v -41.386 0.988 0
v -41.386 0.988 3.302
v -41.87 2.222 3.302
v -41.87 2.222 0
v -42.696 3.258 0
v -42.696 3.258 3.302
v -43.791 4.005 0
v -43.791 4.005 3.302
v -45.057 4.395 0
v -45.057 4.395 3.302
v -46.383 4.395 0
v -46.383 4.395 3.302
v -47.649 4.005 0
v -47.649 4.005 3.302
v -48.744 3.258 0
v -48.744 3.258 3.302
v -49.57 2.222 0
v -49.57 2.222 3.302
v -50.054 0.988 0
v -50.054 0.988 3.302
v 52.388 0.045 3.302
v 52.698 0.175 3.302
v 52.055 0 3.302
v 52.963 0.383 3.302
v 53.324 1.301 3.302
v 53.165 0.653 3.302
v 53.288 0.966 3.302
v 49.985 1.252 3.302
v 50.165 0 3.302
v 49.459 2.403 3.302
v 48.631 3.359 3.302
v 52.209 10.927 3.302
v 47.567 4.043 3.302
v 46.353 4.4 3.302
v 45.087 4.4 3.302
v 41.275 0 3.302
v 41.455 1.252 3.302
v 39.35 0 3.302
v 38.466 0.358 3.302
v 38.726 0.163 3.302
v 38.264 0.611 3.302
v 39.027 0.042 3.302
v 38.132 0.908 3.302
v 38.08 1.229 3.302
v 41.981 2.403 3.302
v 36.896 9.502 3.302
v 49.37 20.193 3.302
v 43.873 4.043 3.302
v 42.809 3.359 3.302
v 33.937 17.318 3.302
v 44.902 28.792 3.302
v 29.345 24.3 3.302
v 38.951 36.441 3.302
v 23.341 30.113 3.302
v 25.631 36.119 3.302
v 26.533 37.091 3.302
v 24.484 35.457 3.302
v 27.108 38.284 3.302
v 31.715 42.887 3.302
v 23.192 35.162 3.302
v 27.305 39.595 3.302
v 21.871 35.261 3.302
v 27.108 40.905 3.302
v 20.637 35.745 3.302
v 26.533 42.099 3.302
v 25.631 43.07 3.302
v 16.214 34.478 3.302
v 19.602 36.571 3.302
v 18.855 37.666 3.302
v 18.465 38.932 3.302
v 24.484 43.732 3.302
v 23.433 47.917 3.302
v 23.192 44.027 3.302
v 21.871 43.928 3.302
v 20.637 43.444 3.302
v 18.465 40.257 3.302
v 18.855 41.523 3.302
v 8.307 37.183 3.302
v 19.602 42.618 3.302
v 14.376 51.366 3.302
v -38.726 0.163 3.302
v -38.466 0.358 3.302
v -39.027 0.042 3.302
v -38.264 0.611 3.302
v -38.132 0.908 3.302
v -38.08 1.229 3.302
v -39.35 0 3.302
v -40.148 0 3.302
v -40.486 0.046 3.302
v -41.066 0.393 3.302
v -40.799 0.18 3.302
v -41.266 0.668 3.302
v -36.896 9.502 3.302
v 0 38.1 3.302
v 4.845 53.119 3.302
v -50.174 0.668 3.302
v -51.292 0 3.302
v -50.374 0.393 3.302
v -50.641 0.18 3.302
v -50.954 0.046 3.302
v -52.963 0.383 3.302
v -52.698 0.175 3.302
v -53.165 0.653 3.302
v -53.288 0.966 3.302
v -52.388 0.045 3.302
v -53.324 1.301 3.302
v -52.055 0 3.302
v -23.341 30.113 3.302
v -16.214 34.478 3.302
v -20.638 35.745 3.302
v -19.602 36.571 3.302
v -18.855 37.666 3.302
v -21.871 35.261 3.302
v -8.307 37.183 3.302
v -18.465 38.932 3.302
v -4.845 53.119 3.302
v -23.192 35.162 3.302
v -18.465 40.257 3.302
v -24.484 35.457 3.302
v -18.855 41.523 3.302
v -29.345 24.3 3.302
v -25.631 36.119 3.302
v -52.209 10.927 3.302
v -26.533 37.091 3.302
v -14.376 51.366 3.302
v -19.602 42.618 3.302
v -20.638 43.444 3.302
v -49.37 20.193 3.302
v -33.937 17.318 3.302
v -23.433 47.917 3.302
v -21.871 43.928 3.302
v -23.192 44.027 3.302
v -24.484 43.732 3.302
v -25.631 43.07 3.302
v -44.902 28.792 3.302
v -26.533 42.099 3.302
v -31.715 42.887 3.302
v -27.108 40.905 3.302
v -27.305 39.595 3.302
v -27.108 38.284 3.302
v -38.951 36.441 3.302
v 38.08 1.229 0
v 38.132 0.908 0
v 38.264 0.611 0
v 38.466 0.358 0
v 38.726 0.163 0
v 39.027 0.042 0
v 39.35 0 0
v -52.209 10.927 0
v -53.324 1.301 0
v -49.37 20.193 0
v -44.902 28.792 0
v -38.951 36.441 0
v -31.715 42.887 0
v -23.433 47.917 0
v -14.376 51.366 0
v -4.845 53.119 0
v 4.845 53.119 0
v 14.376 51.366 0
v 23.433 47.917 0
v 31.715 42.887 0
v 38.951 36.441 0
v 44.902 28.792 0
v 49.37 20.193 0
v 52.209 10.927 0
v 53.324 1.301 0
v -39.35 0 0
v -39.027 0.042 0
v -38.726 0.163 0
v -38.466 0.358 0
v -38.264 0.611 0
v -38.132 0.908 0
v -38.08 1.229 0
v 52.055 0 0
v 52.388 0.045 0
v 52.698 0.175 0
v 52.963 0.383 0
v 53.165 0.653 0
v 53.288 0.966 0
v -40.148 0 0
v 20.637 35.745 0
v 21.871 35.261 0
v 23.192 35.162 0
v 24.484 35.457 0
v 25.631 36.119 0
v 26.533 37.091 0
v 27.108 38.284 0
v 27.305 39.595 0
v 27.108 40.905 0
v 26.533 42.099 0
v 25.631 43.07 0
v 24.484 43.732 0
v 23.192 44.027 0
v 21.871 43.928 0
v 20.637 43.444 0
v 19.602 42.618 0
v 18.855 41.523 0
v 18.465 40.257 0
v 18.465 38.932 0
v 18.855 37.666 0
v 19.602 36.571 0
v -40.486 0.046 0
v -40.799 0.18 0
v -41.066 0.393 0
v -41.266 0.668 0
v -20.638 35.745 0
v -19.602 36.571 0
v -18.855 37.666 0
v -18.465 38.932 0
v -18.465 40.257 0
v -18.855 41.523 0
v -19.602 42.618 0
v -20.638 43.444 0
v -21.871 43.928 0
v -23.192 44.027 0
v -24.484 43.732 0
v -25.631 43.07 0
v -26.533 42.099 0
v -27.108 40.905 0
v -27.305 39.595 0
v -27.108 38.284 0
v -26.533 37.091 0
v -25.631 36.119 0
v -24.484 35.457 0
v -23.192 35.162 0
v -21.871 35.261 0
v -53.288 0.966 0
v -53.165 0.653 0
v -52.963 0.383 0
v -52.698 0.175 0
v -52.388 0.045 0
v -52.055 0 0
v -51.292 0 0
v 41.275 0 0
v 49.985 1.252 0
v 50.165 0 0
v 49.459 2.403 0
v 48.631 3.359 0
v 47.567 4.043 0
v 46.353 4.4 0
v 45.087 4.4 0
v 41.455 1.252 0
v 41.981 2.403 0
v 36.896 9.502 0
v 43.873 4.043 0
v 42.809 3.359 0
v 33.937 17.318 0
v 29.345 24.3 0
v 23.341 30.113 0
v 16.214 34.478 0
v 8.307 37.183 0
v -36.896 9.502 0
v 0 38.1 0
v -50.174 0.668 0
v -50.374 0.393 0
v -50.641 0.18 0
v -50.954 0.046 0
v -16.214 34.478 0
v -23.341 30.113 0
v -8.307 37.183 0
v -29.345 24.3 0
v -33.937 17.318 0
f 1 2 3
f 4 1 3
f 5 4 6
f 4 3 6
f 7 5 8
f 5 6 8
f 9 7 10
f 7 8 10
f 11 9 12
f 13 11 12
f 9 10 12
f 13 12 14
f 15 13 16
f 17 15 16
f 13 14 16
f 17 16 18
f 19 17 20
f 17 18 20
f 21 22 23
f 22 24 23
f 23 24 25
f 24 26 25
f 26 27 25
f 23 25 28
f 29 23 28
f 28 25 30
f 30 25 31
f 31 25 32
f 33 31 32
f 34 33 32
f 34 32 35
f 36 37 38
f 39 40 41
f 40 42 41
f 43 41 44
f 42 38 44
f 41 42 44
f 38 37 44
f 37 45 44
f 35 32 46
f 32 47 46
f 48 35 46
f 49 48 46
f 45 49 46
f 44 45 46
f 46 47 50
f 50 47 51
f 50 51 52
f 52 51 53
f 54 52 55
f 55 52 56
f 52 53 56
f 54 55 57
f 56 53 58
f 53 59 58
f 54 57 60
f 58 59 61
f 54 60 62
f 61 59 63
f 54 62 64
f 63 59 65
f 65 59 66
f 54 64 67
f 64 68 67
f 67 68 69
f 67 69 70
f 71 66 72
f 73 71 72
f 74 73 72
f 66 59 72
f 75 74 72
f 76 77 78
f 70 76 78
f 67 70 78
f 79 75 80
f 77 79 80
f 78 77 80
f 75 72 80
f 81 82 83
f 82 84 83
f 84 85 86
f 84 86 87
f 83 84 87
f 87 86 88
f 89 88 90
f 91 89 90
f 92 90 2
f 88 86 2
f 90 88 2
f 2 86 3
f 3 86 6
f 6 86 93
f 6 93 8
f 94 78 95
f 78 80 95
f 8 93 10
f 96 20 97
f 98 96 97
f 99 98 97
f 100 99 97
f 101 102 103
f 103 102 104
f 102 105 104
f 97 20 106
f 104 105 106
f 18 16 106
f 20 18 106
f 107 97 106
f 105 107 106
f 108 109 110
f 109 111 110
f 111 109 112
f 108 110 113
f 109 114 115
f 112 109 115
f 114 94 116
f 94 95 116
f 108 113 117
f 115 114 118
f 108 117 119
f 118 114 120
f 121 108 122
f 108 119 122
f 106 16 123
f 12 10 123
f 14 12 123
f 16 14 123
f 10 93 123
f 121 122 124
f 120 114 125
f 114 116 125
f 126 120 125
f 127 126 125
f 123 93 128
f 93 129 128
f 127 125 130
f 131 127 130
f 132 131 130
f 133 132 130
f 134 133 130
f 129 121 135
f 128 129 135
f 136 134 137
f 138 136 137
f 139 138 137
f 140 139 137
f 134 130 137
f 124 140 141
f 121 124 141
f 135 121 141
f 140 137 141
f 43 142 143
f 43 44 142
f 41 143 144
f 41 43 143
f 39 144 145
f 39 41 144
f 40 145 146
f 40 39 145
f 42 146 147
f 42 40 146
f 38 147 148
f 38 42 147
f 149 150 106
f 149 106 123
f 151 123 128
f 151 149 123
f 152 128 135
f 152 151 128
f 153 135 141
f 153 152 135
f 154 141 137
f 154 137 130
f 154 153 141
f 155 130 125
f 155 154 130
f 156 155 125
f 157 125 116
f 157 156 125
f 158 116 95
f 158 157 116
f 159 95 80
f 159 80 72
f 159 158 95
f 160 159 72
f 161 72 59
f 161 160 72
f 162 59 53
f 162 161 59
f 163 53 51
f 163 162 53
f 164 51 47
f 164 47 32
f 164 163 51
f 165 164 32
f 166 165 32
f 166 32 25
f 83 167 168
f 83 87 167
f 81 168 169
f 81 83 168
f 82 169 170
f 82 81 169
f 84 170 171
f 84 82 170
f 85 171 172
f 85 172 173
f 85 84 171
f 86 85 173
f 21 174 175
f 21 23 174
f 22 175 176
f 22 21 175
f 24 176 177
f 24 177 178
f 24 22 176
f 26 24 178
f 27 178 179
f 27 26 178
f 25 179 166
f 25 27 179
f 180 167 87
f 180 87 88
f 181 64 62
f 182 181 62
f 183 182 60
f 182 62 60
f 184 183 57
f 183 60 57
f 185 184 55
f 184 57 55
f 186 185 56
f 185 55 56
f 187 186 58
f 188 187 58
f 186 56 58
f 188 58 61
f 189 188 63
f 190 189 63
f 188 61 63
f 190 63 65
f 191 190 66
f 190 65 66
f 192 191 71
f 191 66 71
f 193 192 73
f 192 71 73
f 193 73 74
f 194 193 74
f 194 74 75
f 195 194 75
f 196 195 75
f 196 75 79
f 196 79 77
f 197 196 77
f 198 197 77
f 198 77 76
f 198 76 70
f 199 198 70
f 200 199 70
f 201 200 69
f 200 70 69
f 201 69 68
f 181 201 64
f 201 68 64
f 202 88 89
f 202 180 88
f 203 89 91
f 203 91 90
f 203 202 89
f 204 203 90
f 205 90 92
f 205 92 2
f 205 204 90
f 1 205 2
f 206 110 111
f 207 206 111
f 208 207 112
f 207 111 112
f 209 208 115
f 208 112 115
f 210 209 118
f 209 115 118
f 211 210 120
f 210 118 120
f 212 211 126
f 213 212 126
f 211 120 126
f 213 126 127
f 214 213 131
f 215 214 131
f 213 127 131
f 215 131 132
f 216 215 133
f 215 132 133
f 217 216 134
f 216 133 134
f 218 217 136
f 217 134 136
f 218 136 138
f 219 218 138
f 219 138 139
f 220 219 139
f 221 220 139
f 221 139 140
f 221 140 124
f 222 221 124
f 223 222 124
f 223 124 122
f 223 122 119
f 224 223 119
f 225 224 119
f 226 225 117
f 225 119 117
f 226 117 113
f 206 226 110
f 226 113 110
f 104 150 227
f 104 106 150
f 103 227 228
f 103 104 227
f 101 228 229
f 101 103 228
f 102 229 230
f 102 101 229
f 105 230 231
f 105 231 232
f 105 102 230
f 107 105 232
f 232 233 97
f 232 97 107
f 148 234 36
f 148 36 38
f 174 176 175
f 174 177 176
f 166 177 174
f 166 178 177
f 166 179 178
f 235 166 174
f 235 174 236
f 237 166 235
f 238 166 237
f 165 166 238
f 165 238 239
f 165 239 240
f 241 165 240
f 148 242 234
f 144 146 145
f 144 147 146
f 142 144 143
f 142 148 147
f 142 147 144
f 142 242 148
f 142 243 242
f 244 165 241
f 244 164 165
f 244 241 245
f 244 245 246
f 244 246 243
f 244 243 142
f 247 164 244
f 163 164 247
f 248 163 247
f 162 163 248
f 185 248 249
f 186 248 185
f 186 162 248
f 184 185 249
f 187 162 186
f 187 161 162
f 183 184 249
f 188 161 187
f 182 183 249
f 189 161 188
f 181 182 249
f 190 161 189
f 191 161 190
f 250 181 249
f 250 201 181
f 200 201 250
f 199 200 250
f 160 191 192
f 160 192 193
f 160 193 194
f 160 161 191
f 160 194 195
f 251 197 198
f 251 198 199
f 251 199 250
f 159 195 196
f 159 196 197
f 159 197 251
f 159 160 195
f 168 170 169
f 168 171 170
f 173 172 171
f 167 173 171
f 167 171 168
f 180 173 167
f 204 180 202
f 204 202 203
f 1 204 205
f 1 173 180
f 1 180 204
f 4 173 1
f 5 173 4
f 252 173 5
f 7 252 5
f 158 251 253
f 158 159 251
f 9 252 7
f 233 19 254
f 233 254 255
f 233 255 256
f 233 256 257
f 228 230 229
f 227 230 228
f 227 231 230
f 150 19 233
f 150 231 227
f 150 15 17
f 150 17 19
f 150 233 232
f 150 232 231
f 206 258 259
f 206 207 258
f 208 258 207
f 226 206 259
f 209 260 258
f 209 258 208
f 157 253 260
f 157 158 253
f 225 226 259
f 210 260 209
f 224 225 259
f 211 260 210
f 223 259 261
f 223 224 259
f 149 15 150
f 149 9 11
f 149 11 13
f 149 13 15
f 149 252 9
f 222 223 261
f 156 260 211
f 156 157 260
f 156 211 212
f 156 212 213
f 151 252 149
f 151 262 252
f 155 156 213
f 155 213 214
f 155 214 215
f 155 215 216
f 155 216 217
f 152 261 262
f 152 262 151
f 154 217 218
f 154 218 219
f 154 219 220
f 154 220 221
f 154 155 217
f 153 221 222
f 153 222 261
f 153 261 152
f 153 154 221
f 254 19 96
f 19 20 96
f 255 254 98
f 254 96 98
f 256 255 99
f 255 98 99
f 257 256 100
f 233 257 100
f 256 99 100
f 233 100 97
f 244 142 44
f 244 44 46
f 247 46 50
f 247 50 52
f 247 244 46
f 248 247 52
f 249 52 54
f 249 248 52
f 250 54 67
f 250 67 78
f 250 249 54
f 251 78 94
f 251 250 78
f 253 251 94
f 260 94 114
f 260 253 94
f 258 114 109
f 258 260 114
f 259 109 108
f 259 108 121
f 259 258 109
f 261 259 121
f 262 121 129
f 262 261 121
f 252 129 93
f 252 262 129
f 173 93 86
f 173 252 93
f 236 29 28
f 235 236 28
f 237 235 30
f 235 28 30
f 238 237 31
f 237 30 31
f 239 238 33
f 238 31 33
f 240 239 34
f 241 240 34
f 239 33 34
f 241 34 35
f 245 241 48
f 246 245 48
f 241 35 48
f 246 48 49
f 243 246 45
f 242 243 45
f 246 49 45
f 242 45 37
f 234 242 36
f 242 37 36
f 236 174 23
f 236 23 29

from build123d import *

# Parameters (mm, degrees)
SALIENTE_EXTRUIR1_DEPTH = 3.302
CROQUIS2_R              = 4.445
CORTAR_EXTRUIR1_DEPTH   = 3.302
MATRIZC1_COUNT          = 4
MATRIZC1_ANGLE          = 180
REDONDEO1_R             = 1.27


with BuildPart() as part:
    # Croquis1 → Saliente-Extruir1 (new body)
    with BuildSketch(Plane.XY):
        with BuildLine():
            Line((-38.1, 0), (-53.34, 0))
            ThreePointArc((-53.34, 0), (0, 53.34), (53.34, 0))
            Line((53.34, 0), (38.1, 0))
            ThreePointArc((38.1, 0), (0, 38.1), (-38.1, 0))
        make_face()
    extrude(amount=SALIENTE_EXTRUIR1_DEPTH)

    # Croquis2 → Cortar-Extruir1 (cut)
    with BuildSketch(Plane.XY.offset(3.302)):
        with Locations((-45.72, 0)):
            Circle(CROQUIS2_R)
    cortar_extruir1 = extrude(amount=-CORTAR_EXTRUIR1_DEPTH, mode=Mode.SUBTRACT)

    # MatrizC1: Cortar-Extruir1 ×4 about axis
    matrizc1_axis = Axis((0, 0, 3.302), (0, 0, -1))
    for i in range(1, MATRIZC1_COUNT):
        add(cortar_extruir1.rotate(matrizc1_axis, i * MATRIZC1_ANGLE / (MATRIZC1_COUNT - 1)), mode=Mode.SUBTRACT)

    # Redondeo1
    redondeo1_edges = [part.edges().sort_by_distance(p)[0] for p in [
        (53.34, 0, 1.651),
        (38.1, 0, 1.651),
        (-41.275, 0, 1.651),
        (-50.165, 0, 1.651),
        (-38.1, 0, 1.651),
        (-53.34, 0, 1.651),
    ]]
    fillet(redondeo1_edges, radius=REDONDEO1_R)


solid = part.part
